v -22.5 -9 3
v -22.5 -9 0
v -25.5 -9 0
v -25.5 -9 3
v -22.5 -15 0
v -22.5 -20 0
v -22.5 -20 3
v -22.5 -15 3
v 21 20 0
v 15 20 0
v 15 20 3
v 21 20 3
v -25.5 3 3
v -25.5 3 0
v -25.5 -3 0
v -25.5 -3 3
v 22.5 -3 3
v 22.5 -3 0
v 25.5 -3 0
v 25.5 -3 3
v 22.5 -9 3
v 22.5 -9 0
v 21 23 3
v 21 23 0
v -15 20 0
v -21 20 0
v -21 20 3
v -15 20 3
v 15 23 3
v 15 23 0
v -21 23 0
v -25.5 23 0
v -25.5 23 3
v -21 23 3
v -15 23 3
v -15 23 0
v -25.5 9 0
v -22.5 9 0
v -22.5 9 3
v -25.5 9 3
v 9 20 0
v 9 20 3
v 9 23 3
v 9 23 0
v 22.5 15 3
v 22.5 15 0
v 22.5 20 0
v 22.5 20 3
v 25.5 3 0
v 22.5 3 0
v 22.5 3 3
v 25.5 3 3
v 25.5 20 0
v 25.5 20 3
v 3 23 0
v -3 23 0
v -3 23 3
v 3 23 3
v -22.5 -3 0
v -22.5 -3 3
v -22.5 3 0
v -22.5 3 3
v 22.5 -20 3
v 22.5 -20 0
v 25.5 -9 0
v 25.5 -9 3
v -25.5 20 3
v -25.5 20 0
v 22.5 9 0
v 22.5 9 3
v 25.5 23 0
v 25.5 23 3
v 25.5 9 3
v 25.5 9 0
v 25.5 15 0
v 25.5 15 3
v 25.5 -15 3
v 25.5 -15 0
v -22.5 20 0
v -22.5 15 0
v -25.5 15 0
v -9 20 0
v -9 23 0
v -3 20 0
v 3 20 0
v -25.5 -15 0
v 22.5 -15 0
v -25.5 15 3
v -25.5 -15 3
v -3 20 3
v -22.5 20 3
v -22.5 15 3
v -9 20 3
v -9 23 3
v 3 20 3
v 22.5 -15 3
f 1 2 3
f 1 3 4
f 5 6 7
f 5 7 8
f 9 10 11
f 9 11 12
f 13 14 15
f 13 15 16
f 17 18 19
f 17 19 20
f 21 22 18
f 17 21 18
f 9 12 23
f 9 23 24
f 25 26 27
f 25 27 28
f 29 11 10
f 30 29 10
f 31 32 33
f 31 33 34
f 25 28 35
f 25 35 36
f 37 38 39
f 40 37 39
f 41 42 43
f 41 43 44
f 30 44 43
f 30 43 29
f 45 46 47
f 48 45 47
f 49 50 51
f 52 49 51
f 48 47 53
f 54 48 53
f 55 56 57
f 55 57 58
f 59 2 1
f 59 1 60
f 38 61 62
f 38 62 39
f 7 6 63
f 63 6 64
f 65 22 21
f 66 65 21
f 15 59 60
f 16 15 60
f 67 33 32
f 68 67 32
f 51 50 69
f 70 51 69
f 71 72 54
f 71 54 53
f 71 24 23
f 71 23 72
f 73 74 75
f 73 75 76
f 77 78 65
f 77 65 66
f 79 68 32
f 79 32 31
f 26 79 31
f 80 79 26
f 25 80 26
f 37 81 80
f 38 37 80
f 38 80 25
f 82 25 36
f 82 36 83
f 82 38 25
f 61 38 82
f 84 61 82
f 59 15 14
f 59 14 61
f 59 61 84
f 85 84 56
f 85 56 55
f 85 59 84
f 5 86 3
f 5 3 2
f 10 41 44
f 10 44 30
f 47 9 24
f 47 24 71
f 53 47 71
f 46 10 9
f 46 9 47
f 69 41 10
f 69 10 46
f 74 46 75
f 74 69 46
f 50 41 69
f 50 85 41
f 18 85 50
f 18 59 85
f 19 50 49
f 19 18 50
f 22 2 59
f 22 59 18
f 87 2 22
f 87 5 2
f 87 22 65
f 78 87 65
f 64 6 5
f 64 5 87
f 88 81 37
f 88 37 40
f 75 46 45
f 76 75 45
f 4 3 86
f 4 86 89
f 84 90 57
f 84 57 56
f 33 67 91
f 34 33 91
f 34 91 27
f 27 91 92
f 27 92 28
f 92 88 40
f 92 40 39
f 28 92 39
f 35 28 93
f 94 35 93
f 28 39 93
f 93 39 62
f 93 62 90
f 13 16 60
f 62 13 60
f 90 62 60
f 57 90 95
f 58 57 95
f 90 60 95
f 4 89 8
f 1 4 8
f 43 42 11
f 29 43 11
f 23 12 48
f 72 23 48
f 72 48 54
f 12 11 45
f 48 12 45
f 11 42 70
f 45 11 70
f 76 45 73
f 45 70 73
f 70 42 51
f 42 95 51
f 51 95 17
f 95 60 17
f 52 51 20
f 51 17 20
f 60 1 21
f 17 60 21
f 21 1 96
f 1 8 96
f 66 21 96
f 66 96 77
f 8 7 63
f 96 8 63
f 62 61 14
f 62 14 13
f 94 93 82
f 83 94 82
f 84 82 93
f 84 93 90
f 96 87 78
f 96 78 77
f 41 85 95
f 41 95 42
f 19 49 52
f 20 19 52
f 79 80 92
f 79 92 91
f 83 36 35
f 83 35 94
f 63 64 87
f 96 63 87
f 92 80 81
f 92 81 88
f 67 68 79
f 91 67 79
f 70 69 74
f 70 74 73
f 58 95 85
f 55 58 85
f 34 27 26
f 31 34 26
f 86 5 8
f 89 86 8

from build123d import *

# Parameters (mm, degrees)
SKETCH1_W               = 45
SKETCH1_H               = 40
BOSS_EXTRUDE1_DEPTH     = 3
SKETCH2_W               = 3
SKETCH2_H               = 6
BOSS_EXTRUDE2_DEPTH     = 3
LPATTERN1_COUNT         = 2
LPATTERN1_PITCH         = 12
LPATTERN1_COL_COUNT     = 2
LPATTERN1_COL_PITCH     = 12
SKETCH3_W               = 6
SKETCH3_H               = 3
BOSS_EXTRUDE3_DEPTH     = 3
LPATTERN2_COUNT         = 3
LPATTERN2_PITCH         = 12
LPATTERN2_COL_COUNT     = 3
LPATTERN2_COL_PITCH     = 12
SKETCH6_W               = 1.5
SKETCH6_H               = 3
CUT_EXTRUDE2_DEPTH      = 3
MIRROR1_COPY_1_SKETCH_W = 3
MIRROR1_COPY_1_SKETCH_H = 6
MIRROR1_COPY_1_DEPTH    = 3
MIRROR1_COPY_2_SKETCH_W = 3
MIRROR1_COPY_2_SKETCH_H = 6
MIRROR1_COPY_2_DEPTH    = 3


with BuildPart() as part:
    # Sketch1 → Boss-Extrude1 (new body)
    with BuildSketch(Plane.XY):
        Rectangle(SKETCH1_W, SKETCH1_H)
    extrude(amount=BOSS_EXTRUDE1_DEPTH)

    # Sketch2 → Boss-Extrude2 (add)
    with BuildSketch(Plane.ZY.offset(22.5)):
        with Locations((1.5, 0)):
            Rectangle(SKETCH2_W, SKETCH2_H)
    boss_extrude2 = extrude(amount=BOSS_EXTRUDE2_DEPTH)

    # LPattern1: Boss-Extrude2 ×2
    with Locations(*[(0, -i * LPATTERN1_PITCH, 0) for i in range(1, LPATTERN1_COUNT)]):
        add(boss_extrude2)

    # LPattern1 col: Boss-Extrude2 ×2
    with Locations(*[(0, i * LPATTERN1_COL_PITCH, 0) for i in range(1, LPATTERN1_COL_COUNT)]):
        add(boss_extrude2)

    # Sketch3 → Boss-Extrude3 (add)
    with BuildSketch(Plane(origin=(0, 20, 0), x_dir=(1, 0, 0), z_dir=(0, 1, 0))):
        with Locations((0, -1.5)):
            Rectangle(SKETCH3_W, SKETCH3_H)
    boss_extrude3 = extrude(amount=BOSS_EXTRUDE3_DEPTH)

    # LPattern2: Boss-Extrude3 ×3
    with Locations(*[(-i * LPATTERN2_PITCH, 0, 0) for i in range(1, LPATTERN2_COUNT)]):
        add(boss_extrude3)

    # LPattern2 col: Boss-Extrude3 ×3
    with Locations(*[(i * LPATTERN2_COL_PITCH, 0, 0) for i in range(1, LPATTERN2_COL_COUNT)]):
        add(boss_extrude3)

    # Sketch6 → Cut-Extrude2 (cut)
    with BuildSketch(Plane(origin=(0, 23, 0), x_dir=(1, 0, 0), z_dir=(0, 1, 0))):
        with Locations((26.25, -1.5)):
            Rectangle(SKETCH6_W, SKETCH6_H)
    cut_extrude2 = extrude(amount=-CUT_EXTRUDE2_DEPTH, mode=Mode.SUBTRACT)

    # Mirror1: Boss-Extrude2 across plane
    add(boss_extrude2.mirror(Plane(origin=(0, 0, 0), x_dir=(0, 0, 1), z_dir=(1, 0, 0))))

    # Mirror1 copy 1 sketch → Mirror1 copy 1 (add)
    with BuildSketch(Plane(origin=(22.5, -12, 0), x_dir=(0, 0, 1), z_dir=(1, 0, 0))):
        with Locations((1.5, 0)):
            Rectangle(MIRROR1_COPY_1_SKETCH_W, MIRROR1_COPY_1_SKETCH_H)
    extrude(amount=MIRROR1_COPY_1_DEPTH)

    # Mirror1 copy 2 sketch → Mirror1 copy 2 (add)
    with BuildSketch(Plane(origin=(22.5, 12, 0), x_dir=(0, 0, 1), z_dir=(1, 0, 0))):
        with Locations((1.5, 0)):
            Rectangle(MIRROR1_COPY_2_SKETCH_W, MIRROR1_COPY_2_SKETCH_H)
    extrude(amount=MIRROR1_COPY_2_DEPTH)

    # Mirror2: Cut-Extrude2 across plane
    add(cut_extrude2.mirror(Plane(origin=(0, 0, 0), x_dir=(0, 0, 1), z_dir=(1, 0, 0))), mode=Mode.SUBTRACT)


solid = part.part
